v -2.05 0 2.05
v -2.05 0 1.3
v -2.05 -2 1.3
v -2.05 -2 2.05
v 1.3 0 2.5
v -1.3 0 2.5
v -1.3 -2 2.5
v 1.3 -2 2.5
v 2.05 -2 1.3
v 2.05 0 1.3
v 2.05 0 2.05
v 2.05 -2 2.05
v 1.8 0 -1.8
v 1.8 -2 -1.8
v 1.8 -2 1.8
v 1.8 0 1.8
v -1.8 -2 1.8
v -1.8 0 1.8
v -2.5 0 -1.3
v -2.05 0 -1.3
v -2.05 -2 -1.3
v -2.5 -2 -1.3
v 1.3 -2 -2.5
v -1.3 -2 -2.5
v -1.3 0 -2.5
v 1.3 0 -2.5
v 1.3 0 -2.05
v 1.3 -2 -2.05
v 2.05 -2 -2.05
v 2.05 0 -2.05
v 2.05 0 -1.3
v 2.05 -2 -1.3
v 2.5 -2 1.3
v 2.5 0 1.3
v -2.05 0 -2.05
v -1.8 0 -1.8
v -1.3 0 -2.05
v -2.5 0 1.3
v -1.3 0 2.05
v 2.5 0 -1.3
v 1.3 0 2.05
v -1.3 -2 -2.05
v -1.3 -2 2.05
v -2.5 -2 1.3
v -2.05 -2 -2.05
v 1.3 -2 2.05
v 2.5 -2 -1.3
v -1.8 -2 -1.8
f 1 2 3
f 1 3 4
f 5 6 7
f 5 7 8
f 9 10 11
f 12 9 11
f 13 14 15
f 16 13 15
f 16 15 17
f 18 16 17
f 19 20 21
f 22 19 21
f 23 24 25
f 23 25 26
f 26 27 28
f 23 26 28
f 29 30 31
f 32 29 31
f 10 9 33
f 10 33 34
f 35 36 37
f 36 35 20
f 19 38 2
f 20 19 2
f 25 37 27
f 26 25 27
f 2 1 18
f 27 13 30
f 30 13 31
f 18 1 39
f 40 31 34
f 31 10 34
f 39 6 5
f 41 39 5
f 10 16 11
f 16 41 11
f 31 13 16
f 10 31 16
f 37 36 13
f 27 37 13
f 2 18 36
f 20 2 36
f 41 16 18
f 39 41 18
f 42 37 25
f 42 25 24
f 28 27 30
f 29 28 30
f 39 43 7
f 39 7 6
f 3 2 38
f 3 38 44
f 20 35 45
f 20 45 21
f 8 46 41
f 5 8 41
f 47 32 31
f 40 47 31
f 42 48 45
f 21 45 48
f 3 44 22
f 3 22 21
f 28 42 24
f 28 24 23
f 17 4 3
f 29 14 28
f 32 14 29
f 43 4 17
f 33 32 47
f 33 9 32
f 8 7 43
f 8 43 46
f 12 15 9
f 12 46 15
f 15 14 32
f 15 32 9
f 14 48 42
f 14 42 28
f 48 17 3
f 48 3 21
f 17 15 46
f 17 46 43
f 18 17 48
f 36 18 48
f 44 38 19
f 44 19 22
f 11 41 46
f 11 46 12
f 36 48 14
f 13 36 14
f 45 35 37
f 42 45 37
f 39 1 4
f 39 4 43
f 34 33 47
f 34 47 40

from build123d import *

# Parameters (mm, degrees)
F0_W      = 4.1
F0_H      = 4.1
F1_DEPTH  = 2
F2_W      = 2.6
F2_H      = 2
F3_DEPTH  = 0.45
F4_W      = 2
F4_H      = 2.6
F5_DEPTH  = 0.45
F6_W      = 2.6
F6_H      = 2
F7_DEPTH  = 0.45
F8_W      = 2
F8_H      = 2.6
F9_DEPTH  = 0.45
F10_W     = 1.8
F10_H     = 1.8
F11_DEPTH = 2


with BuildPart() as f1:
    # F0 (on Front) → F1 (new body)
    with BuildSketch(Plane.XZ):
        Rectangle(F0_W, F0_H)
    extrude(amount=F1_DEPTH)

    # F2 (on face) → F3 (join)
    with BuildSketch(Plane(origin=(0, 0, -2.05), x_dir=(1, 0, 0), z_dir=(0, 0, -1))):
        with Locations((0, 1)):
            Rectangle(F2_W, F2_H)
    extrude(amount=F3_DEPTH)

    # F4 (on face) → F5 (join)
    with BuildSketch(Plane(origin=(-2.05, 0, 0), x_dir=(0, -1, 0), z_dir=(-1, 0, 0))):
        with Locations((1, 0)):
            Rectangle(F4_W, F4_H)
    extrude(amount=F5_DEPTH)

    # F6 (on face) → F7 (join)
    with BuildSketch(Plane.XY.offset(2.05)):
        with Locations((0, -1)):
            Rectangle(F6_W, F6_H)
    extrude(amount=F7_DEPTH)

    # F8 (on face) → F9 (join)
    with BuildSketch(Plane.YZ.offset(2.05)):
        with Locations((-1, 0)):
            Rectangle(F8_W, F8_H)
    extrude(amount=F9_DEPTH)

    # F10 (on face) → F11 (cut)
    with BuildSketch(Plane.XZ.offset(2)):
        with Locations((0.9, -0.9)):
            Rectangle(F10_W, F10_H)
        with Locations((0.9, 0.9)):
            Rectangle(F10_W, F10_H)
        with Locations((-0.9, -0.9)):
            Rectangle(F10_W, F10_H)
        with Locations((-0.9, 0.9)):
            Rectangle(F10_W, F10_H)
    extrude(amount=-F11_DEPTH, mode=Mode.SUBTRACT)


solid = f1.part
